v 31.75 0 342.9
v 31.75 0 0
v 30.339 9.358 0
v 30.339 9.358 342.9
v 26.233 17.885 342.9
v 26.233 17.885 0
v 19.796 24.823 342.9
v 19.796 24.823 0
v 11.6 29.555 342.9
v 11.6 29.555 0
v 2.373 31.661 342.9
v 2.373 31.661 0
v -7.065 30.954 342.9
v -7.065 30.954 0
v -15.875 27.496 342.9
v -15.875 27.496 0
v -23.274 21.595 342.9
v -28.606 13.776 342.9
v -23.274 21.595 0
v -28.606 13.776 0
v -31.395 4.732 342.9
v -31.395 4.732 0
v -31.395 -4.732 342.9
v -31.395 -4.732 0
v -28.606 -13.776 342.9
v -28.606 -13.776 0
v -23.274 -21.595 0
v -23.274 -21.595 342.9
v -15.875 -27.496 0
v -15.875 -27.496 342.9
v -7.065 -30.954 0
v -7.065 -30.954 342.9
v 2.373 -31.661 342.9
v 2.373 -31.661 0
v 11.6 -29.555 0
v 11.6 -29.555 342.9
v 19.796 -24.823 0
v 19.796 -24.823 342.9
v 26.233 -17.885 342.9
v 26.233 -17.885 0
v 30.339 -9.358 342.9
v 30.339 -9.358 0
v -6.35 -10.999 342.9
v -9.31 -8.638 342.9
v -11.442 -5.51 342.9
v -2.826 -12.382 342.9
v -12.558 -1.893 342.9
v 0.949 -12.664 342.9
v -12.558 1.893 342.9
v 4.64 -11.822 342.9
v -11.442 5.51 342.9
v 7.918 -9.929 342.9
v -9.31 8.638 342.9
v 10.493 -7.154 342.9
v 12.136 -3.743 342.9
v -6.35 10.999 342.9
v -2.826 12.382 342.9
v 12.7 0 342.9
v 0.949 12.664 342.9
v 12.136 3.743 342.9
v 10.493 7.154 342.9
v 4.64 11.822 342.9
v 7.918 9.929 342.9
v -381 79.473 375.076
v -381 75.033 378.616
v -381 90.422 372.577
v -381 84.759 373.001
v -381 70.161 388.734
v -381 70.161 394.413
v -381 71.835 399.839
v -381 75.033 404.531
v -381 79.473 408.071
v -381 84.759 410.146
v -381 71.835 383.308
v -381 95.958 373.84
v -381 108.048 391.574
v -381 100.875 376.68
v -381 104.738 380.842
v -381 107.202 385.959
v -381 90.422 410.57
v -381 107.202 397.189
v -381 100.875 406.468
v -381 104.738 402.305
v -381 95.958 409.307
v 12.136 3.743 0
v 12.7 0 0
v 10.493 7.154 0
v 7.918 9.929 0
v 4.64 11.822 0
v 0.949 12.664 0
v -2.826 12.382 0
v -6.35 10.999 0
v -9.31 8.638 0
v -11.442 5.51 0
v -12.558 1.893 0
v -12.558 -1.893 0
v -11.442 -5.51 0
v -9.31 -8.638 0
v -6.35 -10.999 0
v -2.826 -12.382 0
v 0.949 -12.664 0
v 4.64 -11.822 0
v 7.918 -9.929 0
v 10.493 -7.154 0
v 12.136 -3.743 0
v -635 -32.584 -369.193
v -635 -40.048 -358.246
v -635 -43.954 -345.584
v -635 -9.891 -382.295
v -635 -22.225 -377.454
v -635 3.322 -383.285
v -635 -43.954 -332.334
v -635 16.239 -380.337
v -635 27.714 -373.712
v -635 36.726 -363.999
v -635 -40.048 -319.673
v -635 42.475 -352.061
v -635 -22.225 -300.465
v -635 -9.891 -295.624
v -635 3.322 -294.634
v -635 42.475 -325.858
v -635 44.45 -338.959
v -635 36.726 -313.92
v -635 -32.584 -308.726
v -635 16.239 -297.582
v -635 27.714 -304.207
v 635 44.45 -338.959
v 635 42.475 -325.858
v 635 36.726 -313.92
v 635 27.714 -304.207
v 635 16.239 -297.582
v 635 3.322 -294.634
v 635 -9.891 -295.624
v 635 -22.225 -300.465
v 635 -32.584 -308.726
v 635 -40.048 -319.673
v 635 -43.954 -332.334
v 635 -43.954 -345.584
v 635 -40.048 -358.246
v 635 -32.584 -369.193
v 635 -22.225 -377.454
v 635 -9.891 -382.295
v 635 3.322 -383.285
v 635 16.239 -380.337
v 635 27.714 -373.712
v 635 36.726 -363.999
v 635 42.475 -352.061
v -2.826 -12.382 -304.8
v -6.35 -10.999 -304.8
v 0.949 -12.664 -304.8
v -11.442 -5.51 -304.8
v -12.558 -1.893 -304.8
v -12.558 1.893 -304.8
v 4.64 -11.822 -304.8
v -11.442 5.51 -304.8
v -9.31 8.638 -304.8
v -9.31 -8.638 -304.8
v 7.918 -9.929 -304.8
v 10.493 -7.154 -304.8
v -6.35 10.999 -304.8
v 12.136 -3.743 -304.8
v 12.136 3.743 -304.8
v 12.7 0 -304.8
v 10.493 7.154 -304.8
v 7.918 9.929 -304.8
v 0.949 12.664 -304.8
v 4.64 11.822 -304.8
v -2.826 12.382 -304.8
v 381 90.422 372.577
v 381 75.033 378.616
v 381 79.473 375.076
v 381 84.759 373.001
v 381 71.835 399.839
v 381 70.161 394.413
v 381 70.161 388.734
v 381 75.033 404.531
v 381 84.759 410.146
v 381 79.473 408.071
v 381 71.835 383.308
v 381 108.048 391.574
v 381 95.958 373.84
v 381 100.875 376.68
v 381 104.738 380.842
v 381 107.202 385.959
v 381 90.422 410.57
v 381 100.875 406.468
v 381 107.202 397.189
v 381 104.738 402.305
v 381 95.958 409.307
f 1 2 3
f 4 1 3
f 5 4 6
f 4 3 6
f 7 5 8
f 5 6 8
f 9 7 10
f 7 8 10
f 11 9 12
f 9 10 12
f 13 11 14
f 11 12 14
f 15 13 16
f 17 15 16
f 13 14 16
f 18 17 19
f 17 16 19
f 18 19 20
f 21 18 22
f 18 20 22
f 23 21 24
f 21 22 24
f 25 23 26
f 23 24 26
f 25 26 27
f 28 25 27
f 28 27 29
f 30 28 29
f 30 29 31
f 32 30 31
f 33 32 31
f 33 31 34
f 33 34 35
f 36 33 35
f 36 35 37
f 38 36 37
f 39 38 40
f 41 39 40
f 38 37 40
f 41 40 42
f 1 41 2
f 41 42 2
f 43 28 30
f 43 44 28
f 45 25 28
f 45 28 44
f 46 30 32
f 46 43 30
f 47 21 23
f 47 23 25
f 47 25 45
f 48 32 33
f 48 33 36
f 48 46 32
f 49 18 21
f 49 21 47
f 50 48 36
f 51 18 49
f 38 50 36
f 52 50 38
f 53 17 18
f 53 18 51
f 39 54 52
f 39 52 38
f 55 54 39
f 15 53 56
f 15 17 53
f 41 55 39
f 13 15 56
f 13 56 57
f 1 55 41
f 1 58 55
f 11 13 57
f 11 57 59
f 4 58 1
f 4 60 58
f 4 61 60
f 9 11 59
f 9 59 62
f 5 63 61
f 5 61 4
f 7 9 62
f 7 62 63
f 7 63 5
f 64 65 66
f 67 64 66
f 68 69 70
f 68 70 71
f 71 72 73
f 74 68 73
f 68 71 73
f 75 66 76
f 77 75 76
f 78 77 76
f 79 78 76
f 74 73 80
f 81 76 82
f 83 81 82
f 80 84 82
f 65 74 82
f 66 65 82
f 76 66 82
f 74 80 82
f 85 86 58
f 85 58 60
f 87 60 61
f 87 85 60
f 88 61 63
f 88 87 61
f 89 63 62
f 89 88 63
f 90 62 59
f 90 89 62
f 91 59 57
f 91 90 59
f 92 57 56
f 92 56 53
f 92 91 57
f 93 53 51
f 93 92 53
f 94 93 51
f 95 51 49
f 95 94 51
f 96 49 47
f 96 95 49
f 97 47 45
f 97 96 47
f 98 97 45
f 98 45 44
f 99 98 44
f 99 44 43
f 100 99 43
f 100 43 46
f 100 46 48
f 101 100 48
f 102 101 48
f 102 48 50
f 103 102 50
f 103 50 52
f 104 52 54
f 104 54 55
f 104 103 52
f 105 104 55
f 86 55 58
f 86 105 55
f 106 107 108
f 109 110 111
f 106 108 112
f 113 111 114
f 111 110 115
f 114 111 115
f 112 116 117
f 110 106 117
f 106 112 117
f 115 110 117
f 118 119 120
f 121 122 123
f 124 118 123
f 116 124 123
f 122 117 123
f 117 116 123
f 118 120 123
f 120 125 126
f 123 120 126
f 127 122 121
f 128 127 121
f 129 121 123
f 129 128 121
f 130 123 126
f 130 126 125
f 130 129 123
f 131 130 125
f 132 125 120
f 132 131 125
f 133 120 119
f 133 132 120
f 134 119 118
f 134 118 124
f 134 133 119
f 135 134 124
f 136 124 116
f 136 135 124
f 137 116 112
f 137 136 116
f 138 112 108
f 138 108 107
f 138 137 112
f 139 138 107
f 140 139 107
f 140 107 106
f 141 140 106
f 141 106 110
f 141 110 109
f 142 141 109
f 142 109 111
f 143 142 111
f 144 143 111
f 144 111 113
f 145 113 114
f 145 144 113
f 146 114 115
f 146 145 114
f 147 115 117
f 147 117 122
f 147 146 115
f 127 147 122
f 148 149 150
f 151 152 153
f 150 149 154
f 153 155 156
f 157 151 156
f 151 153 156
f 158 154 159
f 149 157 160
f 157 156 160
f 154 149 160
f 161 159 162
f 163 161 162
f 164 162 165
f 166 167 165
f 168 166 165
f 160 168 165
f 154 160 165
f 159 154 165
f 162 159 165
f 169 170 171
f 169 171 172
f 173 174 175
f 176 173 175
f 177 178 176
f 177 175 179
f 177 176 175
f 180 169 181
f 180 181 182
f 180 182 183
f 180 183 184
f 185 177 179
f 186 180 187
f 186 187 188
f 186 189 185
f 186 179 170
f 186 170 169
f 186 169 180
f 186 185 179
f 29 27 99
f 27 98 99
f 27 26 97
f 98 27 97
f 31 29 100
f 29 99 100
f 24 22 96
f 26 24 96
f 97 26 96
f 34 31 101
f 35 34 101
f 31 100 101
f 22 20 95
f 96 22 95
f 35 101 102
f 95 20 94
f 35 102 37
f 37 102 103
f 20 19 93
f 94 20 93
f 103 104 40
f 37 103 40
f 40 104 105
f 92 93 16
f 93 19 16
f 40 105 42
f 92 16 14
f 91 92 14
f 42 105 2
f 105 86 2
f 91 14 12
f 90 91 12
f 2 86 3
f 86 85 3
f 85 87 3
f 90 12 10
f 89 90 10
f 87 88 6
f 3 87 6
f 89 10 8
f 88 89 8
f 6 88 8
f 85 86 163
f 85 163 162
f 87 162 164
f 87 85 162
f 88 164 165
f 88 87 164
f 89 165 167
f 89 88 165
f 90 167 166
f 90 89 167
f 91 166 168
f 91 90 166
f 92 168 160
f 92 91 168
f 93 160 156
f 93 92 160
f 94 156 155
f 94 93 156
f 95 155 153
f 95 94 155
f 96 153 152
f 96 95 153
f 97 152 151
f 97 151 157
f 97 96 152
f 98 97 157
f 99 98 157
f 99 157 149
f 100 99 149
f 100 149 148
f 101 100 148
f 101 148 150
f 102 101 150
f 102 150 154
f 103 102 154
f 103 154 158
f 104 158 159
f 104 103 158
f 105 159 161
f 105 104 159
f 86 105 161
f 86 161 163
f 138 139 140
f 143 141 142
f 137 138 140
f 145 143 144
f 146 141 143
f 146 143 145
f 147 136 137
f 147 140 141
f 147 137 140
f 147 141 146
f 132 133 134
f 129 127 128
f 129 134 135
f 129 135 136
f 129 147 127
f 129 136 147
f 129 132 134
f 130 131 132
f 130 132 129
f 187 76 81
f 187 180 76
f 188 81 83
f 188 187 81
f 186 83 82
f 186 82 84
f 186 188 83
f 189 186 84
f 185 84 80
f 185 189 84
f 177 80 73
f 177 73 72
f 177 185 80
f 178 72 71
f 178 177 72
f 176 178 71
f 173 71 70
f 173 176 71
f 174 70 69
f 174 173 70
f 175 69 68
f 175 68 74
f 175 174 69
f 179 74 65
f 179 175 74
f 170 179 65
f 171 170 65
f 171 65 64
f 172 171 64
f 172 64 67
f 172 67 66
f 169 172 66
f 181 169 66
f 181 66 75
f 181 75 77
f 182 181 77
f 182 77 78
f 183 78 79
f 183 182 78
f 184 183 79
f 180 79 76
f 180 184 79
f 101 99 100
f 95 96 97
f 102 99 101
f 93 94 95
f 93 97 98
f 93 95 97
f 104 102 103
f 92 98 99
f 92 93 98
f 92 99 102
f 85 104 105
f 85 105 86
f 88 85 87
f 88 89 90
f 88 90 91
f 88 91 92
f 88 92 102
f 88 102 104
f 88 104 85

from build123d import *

# Parameters (mm, degrees)
F0_R     = 31.75
F0_R_2   = 12.7
F1_DEPTH = 342.9
F2_DEPTH = 304.8
F3_R     = 44.45
F4_DEPTH = 635
F5_DEPTH = 635
F6_R     = 19.05
F7_DEPTH = 381
F8_DEPTH = 381


with BuildPart() as f1:
    # F0 (on Top) → F1 (new body)
    with BuildSketch(Plane.XY):
        Circle(F0_R)
        Circle(F0_R_2, mode=Mode.SUBTRACT)
    extrude(amount=F1_DEPTH)


with BuildPart() as f2:
    # F0 (on Top) → F2 (new body)
    with BuildSketch(Plane.XY):
        Circle(F0_R_2)
    extrude(amount=-F2_DEPTH)


with BuildPart() as f4:
    # F3 (on Right) → F4 (new body)
    with BuildSketch(Plane.YZ):
        with Locations((0, -338.9594081884)):
            Circle(F3_R)
    extrude(amount=F4_DEPTH)

    # F3 (on Right) → F5 (join)
    with BuildSketch(Plane.YZ):
        with Locations((0, -338.9594081884)):
            Circle(F3_R)
    extrude(amount=-F5_DEPTH)


with BuildPart() as f7:
    # F6 (on Right) → F7 (new body)
    with BuildSketch(Plane.YZ):
        with Locations((88.997989893, 391.5736377239)):
            Circle(F6_R)
    extrude(amount=F7_DEPTH)

    # F6 (on Right) → F8 (join)
    with BuildSketch(Plane.YZ):
        with Locations((88.997989893, 391.5736377239)):
            Circle(F6_R)
    extrude(amount=-F8_DEPTH)


solid = Compound([f1.part, f2.part, f4.part, f7.part])
